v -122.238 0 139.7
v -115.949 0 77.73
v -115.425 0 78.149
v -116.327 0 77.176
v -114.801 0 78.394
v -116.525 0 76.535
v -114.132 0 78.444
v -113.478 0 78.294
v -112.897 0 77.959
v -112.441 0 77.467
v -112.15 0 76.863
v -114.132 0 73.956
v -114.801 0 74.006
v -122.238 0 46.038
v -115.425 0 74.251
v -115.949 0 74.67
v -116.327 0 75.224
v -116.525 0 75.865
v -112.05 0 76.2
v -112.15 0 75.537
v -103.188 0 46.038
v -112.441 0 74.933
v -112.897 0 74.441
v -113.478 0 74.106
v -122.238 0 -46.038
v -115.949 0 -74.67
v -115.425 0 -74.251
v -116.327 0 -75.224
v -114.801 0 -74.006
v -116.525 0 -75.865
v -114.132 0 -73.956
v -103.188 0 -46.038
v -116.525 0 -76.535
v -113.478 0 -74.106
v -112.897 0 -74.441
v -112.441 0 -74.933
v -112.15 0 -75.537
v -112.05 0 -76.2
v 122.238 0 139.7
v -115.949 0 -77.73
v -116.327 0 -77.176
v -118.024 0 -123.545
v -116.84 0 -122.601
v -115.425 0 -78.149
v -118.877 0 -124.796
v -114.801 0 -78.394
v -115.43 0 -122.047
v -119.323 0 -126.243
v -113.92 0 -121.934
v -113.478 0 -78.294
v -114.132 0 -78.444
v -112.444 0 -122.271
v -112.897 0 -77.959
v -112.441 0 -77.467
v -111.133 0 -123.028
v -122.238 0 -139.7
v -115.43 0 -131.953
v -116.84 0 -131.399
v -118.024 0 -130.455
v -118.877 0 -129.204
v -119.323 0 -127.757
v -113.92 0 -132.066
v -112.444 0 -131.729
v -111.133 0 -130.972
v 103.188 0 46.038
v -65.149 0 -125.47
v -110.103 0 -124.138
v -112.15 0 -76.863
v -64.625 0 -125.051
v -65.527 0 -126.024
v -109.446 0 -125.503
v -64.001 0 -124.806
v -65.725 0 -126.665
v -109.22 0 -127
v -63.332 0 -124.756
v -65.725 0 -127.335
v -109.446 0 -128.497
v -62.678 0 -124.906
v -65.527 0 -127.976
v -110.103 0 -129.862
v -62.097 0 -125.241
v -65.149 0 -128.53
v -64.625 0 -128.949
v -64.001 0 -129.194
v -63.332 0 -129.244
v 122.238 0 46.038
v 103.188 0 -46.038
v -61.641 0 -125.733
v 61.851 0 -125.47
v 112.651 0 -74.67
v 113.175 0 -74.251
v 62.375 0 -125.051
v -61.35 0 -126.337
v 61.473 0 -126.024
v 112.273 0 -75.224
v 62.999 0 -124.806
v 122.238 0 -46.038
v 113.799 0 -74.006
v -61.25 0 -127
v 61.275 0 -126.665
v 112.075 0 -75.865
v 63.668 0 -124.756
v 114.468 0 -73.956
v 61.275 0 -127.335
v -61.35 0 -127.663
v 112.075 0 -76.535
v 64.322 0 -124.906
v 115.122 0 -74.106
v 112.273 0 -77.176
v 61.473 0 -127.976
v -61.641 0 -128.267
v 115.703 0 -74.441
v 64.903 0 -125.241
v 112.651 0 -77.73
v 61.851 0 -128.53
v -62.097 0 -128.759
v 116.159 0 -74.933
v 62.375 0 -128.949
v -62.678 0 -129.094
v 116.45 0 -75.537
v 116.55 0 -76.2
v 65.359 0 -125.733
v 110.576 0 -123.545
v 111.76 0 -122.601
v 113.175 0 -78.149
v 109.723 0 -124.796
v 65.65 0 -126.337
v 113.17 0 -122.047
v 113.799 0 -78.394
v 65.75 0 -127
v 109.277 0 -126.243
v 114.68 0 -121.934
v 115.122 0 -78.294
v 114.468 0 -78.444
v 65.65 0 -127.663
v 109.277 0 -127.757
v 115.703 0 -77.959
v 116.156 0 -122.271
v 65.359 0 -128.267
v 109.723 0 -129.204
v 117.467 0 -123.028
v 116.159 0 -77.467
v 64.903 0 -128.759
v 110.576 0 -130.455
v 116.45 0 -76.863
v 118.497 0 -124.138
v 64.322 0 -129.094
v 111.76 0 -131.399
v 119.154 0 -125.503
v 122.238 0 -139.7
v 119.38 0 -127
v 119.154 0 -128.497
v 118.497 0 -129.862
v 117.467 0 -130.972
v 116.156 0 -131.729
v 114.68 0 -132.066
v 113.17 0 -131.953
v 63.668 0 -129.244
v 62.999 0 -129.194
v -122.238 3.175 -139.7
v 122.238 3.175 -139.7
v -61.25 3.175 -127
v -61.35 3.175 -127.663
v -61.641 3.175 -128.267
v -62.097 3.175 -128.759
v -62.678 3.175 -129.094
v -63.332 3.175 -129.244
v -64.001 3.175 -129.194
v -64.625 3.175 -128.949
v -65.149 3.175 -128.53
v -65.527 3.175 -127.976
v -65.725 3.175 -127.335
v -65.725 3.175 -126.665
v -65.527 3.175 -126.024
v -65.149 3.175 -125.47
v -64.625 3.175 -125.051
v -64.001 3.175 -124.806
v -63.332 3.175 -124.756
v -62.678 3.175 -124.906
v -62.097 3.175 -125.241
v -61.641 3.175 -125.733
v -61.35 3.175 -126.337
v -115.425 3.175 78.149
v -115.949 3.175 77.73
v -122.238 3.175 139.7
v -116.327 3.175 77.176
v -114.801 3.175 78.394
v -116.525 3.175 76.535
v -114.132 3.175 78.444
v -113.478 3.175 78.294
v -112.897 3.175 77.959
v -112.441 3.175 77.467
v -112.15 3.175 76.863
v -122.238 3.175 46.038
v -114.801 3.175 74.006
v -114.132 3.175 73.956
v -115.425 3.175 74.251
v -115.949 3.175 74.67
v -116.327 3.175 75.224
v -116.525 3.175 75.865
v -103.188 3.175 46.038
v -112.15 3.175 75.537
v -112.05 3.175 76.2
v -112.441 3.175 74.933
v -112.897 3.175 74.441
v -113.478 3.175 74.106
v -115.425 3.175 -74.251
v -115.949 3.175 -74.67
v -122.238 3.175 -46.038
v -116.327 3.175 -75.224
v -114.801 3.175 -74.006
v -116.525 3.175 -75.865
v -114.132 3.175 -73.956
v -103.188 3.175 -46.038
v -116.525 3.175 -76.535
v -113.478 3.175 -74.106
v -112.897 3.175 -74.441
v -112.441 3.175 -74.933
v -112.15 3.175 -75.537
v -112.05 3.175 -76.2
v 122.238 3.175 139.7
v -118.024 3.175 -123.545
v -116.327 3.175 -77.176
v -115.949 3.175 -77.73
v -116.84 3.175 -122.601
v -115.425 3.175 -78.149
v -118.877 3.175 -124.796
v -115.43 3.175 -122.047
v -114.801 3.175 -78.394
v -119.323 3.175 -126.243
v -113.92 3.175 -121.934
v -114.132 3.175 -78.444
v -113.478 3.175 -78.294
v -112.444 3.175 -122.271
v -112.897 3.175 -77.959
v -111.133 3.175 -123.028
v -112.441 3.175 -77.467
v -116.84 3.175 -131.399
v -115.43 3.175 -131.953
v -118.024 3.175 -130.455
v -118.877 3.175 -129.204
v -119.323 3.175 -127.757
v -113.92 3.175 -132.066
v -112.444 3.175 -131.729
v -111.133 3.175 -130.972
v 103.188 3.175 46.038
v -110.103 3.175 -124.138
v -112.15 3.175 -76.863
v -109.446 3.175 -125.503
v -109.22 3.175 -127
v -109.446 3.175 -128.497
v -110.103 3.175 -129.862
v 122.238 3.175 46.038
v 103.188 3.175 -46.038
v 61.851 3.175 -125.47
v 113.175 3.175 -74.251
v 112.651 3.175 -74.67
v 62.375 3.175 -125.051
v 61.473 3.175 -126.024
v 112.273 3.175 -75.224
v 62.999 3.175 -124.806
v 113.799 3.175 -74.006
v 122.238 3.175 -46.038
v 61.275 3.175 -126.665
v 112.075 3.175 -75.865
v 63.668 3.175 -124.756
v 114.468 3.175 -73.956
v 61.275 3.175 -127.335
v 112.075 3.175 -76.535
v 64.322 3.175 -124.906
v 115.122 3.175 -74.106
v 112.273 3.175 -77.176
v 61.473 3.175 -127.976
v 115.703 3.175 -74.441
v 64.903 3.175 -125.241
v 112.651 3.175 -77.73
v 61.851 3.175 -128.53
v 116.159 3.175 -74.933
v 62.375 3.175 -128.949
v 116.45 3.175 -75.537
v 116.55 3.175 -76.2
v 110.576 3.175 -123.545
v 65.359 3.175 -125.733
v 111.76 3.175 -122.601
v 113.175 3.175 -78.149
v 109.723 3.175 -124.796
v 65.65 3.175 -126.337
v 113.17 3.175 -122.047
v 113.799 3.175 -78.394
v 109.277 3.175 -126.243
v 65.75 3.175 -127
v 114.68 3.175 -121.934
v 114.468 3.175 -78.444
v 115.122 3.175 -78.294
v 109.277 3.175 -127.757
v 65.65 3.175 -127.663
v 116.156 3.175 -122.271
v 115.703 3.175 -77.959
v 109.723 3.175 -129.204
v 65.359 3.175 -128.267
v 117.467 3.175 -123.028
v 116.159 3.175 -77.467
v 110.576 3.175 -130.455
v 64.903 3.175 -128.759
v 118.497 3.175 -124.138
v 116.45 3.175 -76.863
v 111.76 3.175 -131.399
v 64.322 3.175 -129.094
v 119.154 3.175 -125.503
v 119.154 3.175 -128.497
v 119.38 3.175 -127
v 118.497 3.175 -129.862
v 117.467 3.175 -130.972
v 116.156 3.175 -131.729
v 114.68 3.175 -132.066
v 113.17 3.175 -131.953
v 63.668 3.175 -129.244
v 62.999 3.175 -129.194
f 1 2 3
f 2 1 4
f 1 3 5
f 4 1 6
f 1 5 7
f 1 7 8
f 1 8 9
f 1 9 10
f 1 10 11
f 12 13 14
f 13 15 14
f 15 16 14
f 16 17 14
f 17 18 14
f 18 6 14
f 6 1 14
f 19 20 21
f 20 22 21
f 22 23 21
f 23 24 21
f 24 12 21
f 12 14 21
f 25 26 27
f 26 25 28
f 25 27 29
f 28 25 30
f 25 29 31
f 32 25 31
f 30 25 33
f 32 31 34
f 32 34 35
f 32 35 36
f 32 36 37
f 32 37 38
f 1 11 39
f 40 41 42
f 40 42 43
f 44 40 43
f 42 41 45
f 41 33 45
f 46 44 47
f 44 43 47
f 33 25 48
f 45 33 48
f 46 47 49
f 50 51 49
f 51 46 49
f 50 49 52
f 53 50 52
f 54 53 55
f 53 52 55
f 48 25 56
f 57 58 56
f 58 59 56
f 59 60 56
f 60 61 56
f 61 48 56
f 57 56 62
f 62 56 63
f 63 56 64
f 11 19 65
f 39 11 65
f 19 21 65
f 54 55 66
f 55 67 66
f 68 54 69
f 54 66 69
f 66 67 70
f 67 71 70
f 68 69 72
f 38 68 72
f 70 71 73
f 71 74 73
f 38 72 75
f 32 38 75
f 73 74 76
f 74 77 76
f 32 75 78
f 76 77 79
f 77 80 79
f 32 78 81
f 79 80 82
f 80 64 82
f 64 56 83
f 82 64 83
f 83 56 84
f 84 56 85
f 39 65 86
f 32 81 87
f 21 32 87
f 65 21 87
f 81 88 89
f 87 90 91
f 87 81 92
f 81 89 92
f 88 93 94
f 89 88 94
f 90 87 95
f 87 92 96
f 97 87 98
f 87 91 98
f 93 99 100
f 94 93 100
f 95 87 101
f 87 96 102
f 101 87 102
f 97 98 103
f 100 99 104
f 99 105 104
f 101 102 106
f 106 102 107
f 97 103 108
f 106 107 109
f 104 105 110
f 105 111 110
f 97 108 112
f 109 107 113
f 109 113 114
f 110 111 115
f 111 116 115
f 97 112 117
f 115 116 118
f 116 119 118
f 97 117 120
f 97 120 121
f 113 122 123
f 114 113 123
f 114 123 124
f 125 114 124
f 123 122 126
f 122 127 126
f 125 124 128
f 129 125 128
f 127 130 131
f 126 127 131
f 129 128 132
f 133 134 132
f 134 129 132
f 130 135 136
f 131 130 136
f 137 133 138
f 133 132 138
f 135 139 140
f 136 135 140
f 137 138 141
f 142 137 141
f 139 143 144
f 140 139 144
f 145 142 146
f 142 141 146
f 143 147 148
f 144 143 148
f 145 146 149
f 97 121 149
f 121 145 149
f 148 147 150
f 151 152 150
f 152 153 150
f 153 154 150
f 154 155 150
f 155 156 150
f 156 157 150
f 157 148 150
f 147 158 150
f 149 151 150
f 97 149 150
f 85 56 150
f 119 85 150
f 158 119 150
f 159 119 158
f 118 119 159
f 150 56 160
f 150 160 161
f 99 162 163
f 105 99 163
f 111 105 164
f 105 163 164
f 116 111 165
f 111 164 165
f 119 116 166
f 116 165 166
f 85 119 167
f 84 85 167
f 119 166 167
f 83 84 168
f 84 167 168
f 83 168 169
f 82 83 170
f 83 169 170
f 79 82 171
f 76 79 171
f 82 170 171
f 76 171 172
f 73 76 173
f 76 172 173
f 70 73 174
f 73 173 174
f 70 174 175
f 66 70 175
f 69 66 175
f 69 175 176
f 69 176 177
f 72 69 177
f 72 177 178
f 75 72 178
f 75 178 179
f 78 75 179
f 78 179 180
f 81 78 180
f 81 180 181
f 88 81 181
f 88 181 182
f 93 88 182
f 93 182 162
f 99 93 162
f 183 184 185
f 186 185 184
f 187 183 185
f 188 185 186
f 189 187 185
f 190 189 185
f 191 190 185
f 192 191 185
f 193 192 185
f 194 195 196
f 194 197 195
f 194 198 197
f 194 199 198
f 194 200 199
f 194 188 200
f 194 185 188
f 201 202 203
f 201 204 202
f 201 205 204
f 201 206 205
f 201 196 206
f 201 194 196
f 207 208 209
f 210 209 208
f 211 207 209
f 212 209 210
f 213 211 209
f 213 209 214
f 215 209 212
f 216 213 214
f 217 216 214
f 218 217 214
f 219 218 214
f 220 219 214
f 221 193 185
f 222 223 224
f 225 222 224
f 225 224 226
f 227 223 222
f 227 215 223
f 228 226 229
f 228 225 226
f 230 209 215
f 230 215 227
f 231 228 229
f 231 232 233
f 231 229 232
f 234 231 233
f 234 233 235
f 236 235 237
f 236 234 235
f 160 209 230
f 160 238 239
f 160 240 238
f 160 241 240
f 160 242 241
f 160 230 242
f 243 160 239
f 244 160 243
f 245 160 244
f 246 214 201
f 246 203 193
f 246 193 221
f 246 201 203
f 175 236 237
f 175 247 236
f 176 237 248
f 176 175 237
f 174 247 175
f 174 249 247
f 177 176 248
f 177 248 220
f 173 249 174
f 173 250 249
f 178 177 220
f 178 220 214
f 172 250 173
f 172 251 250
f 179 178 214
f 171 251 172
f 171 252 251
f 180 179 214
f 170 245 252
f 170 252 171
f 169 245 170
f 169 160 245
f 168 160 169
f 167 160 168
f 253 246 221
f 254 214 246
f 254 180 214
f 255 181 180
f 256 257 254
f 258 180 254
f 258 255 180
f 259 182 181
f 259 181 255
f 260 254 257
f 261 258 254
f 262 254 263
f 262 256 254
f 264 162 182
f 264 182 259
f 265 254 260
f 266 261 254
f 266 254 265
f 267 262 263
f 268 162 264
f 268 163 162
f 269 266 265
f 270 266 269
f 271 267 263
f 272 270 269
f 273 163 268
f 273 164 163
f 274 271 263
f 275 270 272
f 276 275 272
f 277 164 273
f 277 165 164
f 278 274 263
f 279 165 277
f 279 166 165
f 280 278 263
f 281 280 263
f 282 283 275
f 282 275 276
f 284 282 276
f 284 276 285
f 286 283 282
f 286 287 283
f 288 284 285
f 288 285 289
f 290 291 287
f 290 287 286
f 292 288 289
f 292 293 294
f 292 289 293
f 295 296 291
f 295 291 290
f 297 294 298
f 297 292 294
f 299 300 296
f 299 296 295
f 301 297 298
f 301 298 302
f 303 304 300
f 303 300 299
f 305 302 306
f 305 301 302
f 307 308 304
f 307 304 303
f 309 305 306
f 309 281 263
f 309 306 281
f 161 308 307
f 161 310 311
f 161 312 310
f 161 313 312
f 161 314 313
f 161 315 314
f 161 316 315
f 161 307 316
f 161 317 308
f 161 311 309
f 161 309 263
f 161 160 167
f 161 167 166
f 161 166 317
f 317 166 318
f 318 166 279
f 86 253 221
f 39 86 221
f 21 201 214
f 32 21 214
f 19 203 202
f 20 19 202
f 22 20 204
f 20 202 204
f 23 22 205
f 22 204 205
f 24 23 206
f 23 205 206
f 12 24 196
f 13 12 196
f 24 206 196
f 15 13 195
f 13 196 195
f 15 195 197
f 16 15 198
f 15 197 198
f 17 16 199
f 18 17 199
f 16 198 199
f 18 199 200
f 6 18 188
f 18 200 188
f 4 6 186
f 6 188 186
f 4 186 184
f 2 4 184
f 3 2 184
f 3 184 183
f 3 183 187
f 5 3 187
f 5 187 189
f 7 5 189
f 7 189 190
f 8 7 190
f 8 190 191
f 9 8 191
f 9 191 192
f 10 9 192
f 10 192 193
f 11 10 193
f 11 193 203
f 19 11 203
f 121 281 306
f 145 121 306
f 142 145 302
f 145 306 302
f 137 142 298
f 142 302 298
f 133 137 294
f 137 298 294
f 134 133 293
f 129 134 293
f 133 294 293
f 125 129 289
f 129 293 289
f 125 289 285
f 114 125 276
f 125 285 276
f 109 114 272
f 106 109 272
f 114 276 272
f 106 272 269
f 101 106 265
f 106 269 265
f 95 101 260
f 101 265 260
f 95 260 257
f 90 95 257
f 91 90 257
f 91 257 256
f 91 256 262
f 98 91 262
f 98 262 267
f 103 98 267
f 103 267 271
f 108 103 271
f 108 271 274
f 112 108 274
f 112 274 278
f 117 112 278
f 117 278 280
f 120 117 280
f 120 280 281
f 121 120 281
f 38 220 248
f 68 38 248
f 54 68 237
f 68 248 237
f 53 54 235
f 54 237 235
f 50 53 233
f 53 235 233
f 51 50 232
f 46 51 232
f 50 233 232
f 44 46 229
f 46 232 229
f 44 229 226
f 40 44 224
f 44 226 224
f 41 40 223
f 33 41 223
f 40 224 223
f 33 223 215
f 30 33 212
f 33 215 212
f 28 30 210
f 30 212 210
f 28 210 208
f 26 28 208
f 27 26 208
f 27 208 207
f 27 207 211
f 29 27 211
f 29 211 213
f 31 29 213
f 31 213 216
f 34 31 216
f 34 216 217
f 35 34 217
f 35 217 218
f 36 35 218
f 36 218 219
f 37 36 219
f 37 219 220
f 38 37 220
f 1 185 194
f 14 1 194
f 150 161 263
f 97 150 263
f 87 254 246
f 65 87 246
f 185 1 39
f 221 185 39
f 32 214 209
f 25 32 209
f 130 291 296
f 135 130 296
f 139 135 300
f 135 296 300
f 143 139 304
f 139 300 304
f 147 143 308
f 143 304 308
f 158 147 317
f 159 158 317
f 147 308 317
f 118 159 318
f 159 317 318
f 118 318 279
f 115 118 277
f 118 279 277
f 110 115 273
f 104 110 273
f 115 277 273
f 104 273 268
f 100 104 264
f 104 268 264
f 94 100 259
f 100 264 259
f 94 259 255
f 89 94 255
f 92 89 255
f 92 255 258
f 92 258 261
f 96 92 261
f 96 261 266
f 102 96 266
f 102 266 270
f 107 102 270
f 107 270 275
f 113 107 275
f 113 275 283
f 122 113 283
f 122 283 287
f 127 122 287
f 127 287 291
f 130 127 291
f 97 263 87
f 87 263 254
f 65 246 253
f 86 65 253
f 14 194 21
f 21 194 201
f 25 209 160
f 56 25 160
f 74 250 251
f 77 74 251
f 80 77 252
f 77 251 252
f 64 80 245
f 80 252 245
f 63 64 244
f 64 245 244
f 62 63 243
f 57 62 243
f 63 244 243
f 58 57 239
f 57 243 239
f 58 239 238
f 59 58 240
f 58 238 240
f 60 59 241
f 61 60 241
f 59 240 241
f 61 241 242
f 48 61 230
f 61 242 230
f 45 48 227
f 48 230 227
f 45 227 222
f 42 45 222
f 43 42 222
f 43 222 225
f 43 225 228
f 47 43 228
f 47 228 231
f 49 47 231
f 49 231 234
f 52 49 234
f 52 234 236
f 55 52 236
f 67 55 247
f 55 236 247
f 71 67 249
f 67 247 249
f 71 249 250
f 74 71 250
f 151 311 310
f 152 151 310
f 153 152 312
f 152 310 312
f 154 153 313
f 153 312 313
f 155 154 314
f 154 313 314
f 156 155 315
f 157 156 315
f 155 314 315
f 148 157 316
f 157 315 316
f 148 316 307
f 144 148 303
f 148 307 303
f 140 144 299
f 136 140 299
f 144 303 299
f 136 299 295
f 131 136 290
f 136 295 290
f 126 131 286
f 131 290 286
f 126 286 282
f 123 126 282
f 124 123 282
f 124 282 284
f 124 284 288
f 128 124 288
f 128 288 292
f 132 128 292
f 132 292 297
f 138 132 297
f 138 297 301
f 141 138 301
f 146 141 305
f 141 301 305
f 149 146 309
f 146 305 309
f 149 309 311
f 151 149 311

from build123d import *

# Parameters (mm, degrees)
SKETCH1_W           = 457.2
SKETCH1_H           = 279.4
BOSS_EXTRUDE1_DEPTH = 3.175
SKETCH2_R           = 5.08
CUT_EXTRUDE1_DEPTH  = 3.175
SKETCH4_R           = 2.25
CUT_EXTRUDE3_DEPTH  = 25.4
SKETCH6_R           = 2.25
CUT_EXTRUDE5_DEPTH  = 637.032
SKETCH7_R           = 5.08
SKETCH7_R_2         = 2.25
SKETCH7_W           = 1.5875
SKETCH7_H           = 31.75
CUT_EXTRUDE6_DEPTH  = 25.4


with BuildPart() as part:
    # Sketch1 → Boss-Extrude1 (new body)
    with BuildSketch(Plane(origin=(0, 0, 0), x_dir=(1, 0, 0), z_dir=(0, 1, 0))):
        Rectangle(SKETCH1_W, SKETCH1_H)
    extrude(amount=BOSS_EXTRUDE1_DEPTH)

    # Sketch2 → Cut-Extrude1 (cut)
    with BuildSketch(Plane(origin=(0, 3.175, 0), x_dir=(1, 0, 0), z_dir=(0, 1, 0))):
        with Locations((-114.3, 127)):
            Circle(SKETCH2_R)
        with Locations((114.3, 127)):
            Circle(SKETCH2_R)
        with Locations((-215.9, -127)):
            Circle(SKETCH2_R)
        with Locations((215.9, -127)):
            Circle(SKETCH2_R)
        with BuildLine():
            Line((-212.307897552, 130.592102448), (-205.957897552, 124.242102448))
            ThreePointArc((-205.957897552, 124.242102448), (-205.957897552, 117.057897552), (-213.142102448, 117.057897552))
            Line((-213.142102448, 117.057897552), (-219.492102448, 123.407897552))
            ThreePointArc((-219.492102448, 123.407897552), (-219.492102448, 130.592102448), (-212.307897552, 130.592102448))
        make_face()
        with BuildLine():
            Line((212.307897552, 130.592102448), (205.957897552, 124.242102448))
            ThreePointArc((205.957897552, 124.242102448), (205.957897552, 117.057897552), (213.142102448, 117.057897552))
            Line((213.142102448, 117.057897552), (219.492102448, 123.407897552))
            ThreePointArc((219.492102448, 123.407897552), (219.492102448, 130.592102448), (212.307897552, 130.592102448))
        make_face()
    extrude(amount=-CUT_EXTRUDE1_DEPTH, mode=Mode.SUBTRACT)

    # Sketch4 → Cut-Extrude3 (cut)
    with BuildSketch(Plane(origin=(0, 3.175, 0), x_dir=(1, 0, 0), z_dir=(0, 1, 0))):
        with Locations((-196.85, 127)):
            Circle(SKETCH4_R)
        with Locations((-215.9, 107.95)):
            Circle(SKETCH4_R)
        with Locations((196.85, 127)):
            Circle(SKETCH4_R)
        with Locations((215.9, 107.95)):
            Circle(SKETCH4_R)
    extrude(amount=-CUT_EXTRUDE3_DEPTH, mode=Mode.SUBTRACT)

    # Sketch6 → Cut-Extrude5 (cut)
    with BuildSketch(Plane(origin=(0, 3.175, 0), x_dir=(1, 0, 0), z_dir=(0, 1, 0))):
        with Locations((-215.9, 76.2)):
            Circle(SKETCH6_R)
        with Locations((-215.9, 0)):
            Circle(SKETCH6_R)
        with Locations((-215.9, -88.9)):
            Circle(SKETCH6_R)
        with Locations((-114.3, -76.2)):
            Circle(SKETCH6_R)
        with Locations((-114.3, 76.2)):
            Circle(SKETCH6_R)
        with Locations((-63.5, 127)):
            Circle(SKETCH6_R)
        with Locations((63.5, 127)):
            Circle(SKETCH6_R)
        with Locations((114.3, 76.2)):
            Circle(SKETCH6_R)
        with Locations((215.9, -88.9)):
            Circle(SKETCH6_R)
        with Locations((215.9, 0)):
            Circle(SKETCH6_R)
        with Locations((215.9, 76.2)):
            Circle(SKETCH6_R)
    extrude(amount=-CUT_EXTRUDE5_DEPTH, mode=Mode.SUBTRACT)

    # Sketch7 → Cut-Extrude6 (cut)
    with BuildSketch(Plane(origin=(0, 3.175, 0), x_dir=(1, 0, 0), z_dir=(0, 1, 0))):
        Polygon((-104.775, -44.45), (-104.775, 44.45), (-123.825, 44.45), (-123.825, 107.95), (-123.825, 139.7), (-228.6, 139.7), (-228.6, -139.7), (-123.825, -139.7), (-123.825, -107.95), (-123.825, -44.45), align=None)
        with Locations((-215.9, -127)):
            Circle(SKETCH7_R, mode=Mode.SUBTRACT)
        with Locations((-215.9, -88.9)):
            Circle(SKETCH7_R_2, mode=Mode.SUBTRACT)
        with Locations((-215.9, 0)):
            Circle(SKETCH7_R_2, mode=Mode.SUBTRACT)
        with Locations((-114.3, -19.05)):
            Circle(SKETCH7_R_2, mode=Mode.SUBTRACT)
        with Locations((-114.3, 19.05)):
            Circle(SKETCH7_R_2, mode=Mode.SUBTRACT)
        with Locations((-215.9, 76.2)):
            Circle(SKETCH7_R_2, mode=Mode.SUBTRACT)
        with Locations((-215.9, 107.95)):
            Circle(SKETCH7_R_2, mode=Mode.SUBTRACT)
        with BuildLine():
            Line((-213.142102448, 117.057897552), (-219.492102448, 123.407897552))
            ThreePointArc((-219.492102448, 123.407897552), (-219.492102448, 130.592102448), (-212.307897552, 130.592102448))
            Line((-212.307897552, 130.592102448), (-205.957897552, 124.242102448))
            ThreePointArc((-205.957897552, 124.242102448), (-205.957897552, 117.057897552), (-213.142102448, 117.057897552))
        make_face(mode=Mode.SUBTRACT)
        with Locations((-196.85, 127)):
            Circle(SKETCH7_R_2, mode=Mode.SUBTRACT)
        Polygon((228.6, 139.7), (122.2375, 139.7), (122.2375, 107.95), (122.2375, 46.0375), (103.1875, 46.0375), (103.1875, -46.0375), (122.2375, -46.0375), (122.2375, -107.95), (122.2375, -139.7), (228.6, -139.7), align=None)
        with Locations((215.9, -127)):
            Circle(SKETCH7_R, mode=Mode.SUBTRACT)
        with Locations((215.9, -88.9)):
            Circle(SKETCH7_R_2, mode=Mode.SUBTRACT)
        with Locations((215.9, 0)):
            Circle(SKETCH7_R_2, mode=Mode.SUBTRACT)
        with Locations((215.9, 76.2)):
            Circle(SKETCH7_R_2, mode=Mode.SUBTRACT)
        with Locations((215.9, 107.95)):
            Circle(SKETCH7_R_2, mode=Mode.SUBTRACT)
        with Locations((196.85, 127)):
            Circle(SKETCH7_R_2, mode=Mode.SUBTRACT)
        with BuildLine():
            Line((205.957897552, 124.242102448), (212.307897552, 130.592102448))
            ThreePointArc((212.307897552, 130.592102448), (219.492102448, 130.592102448), (219.492102448, 123.407897552))
            Line((219.492102448, 123.407897552), (213.142102448, 117.057897552))
            ThreePointArc((213.142102448, 117.057897552), (205.957897552, 117.057897552), (205.957897552, 124.242102448))
        make_face(mode=Mode.SUBTRACT)
        Polygon((-123.825, 44.45), (-104.775, 44.45), (-104.775, 46.0375), (-122.2375, 46.0375), (-122.2375, 107.95), (-122.2375, 139.7), (-123.825, 139.7), (-123.825, 107.95), align=None)
        Polygon((-104.775, 46.0375), (-104.775, 44.45), (-104.775, -44.45), (-104.775, -46.0375), (-103.1875, -46.0375), (-103.1875, 46.0375), align=None)
        Polygon((-104.775, -46.0375), (-104.775, -44.45), (-123.825, -44.45), (-123.825, -107.95), (-122.2375, -107.95), (-122.2375, -46.0375), align=None)
        with Locations((-123.03125, -123.825)):
            Rectangle(SKETCH7_W, SKETCH7_H)
        with Locations((-114.3, 19.05)):
            Circle(SKETCH7_R_2)
        with Locations((-114.3, -19.05)):
            Circle(SKETCH7_R_2)
    extrude(amount=-CUT_EXTRUDE6_DEPTH, mode=Mode.SUBTRACT)


solid = part.part
